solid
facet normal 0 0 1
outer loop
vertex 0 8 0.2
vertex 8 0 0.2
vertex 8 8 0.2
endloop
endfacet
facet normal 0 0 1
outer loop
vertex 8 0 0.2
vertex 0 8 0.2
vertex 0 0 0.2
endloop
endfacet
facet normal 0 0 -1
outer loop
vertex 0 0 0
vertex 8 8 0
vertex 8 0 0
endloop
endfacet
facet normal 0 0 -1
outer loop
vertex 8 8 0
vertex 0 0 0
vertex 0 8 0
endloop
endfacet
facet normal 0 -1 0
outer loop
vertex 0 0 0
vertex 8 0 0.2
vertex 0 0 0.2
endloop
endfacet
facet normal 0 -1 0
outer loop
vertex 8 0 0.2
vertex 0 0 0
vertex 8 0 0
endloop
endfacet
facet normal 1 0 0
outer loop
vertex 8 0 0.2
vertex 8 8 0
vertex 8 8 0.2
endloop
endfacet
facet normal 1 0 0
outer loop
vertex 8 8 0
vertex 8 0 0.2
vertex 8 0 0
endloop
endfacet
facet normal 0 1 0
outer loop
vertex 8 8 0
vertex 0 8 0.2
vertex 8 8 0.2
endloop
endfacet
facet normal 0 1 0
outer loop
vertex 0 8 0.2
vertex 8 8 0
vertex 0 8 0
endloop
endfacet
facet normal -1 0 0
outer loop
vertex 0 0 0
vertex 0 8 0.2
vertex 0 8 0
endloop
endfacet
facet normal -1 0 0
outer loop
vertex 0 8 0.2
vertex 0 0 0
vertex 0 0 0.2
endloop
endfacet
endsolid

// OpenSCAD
module suport(lungime_suport,latime_suport,inaltime_suport)
cube([lungime_suport,latime_suport,inaltime_suport]);
suport(8,8,0.2);
